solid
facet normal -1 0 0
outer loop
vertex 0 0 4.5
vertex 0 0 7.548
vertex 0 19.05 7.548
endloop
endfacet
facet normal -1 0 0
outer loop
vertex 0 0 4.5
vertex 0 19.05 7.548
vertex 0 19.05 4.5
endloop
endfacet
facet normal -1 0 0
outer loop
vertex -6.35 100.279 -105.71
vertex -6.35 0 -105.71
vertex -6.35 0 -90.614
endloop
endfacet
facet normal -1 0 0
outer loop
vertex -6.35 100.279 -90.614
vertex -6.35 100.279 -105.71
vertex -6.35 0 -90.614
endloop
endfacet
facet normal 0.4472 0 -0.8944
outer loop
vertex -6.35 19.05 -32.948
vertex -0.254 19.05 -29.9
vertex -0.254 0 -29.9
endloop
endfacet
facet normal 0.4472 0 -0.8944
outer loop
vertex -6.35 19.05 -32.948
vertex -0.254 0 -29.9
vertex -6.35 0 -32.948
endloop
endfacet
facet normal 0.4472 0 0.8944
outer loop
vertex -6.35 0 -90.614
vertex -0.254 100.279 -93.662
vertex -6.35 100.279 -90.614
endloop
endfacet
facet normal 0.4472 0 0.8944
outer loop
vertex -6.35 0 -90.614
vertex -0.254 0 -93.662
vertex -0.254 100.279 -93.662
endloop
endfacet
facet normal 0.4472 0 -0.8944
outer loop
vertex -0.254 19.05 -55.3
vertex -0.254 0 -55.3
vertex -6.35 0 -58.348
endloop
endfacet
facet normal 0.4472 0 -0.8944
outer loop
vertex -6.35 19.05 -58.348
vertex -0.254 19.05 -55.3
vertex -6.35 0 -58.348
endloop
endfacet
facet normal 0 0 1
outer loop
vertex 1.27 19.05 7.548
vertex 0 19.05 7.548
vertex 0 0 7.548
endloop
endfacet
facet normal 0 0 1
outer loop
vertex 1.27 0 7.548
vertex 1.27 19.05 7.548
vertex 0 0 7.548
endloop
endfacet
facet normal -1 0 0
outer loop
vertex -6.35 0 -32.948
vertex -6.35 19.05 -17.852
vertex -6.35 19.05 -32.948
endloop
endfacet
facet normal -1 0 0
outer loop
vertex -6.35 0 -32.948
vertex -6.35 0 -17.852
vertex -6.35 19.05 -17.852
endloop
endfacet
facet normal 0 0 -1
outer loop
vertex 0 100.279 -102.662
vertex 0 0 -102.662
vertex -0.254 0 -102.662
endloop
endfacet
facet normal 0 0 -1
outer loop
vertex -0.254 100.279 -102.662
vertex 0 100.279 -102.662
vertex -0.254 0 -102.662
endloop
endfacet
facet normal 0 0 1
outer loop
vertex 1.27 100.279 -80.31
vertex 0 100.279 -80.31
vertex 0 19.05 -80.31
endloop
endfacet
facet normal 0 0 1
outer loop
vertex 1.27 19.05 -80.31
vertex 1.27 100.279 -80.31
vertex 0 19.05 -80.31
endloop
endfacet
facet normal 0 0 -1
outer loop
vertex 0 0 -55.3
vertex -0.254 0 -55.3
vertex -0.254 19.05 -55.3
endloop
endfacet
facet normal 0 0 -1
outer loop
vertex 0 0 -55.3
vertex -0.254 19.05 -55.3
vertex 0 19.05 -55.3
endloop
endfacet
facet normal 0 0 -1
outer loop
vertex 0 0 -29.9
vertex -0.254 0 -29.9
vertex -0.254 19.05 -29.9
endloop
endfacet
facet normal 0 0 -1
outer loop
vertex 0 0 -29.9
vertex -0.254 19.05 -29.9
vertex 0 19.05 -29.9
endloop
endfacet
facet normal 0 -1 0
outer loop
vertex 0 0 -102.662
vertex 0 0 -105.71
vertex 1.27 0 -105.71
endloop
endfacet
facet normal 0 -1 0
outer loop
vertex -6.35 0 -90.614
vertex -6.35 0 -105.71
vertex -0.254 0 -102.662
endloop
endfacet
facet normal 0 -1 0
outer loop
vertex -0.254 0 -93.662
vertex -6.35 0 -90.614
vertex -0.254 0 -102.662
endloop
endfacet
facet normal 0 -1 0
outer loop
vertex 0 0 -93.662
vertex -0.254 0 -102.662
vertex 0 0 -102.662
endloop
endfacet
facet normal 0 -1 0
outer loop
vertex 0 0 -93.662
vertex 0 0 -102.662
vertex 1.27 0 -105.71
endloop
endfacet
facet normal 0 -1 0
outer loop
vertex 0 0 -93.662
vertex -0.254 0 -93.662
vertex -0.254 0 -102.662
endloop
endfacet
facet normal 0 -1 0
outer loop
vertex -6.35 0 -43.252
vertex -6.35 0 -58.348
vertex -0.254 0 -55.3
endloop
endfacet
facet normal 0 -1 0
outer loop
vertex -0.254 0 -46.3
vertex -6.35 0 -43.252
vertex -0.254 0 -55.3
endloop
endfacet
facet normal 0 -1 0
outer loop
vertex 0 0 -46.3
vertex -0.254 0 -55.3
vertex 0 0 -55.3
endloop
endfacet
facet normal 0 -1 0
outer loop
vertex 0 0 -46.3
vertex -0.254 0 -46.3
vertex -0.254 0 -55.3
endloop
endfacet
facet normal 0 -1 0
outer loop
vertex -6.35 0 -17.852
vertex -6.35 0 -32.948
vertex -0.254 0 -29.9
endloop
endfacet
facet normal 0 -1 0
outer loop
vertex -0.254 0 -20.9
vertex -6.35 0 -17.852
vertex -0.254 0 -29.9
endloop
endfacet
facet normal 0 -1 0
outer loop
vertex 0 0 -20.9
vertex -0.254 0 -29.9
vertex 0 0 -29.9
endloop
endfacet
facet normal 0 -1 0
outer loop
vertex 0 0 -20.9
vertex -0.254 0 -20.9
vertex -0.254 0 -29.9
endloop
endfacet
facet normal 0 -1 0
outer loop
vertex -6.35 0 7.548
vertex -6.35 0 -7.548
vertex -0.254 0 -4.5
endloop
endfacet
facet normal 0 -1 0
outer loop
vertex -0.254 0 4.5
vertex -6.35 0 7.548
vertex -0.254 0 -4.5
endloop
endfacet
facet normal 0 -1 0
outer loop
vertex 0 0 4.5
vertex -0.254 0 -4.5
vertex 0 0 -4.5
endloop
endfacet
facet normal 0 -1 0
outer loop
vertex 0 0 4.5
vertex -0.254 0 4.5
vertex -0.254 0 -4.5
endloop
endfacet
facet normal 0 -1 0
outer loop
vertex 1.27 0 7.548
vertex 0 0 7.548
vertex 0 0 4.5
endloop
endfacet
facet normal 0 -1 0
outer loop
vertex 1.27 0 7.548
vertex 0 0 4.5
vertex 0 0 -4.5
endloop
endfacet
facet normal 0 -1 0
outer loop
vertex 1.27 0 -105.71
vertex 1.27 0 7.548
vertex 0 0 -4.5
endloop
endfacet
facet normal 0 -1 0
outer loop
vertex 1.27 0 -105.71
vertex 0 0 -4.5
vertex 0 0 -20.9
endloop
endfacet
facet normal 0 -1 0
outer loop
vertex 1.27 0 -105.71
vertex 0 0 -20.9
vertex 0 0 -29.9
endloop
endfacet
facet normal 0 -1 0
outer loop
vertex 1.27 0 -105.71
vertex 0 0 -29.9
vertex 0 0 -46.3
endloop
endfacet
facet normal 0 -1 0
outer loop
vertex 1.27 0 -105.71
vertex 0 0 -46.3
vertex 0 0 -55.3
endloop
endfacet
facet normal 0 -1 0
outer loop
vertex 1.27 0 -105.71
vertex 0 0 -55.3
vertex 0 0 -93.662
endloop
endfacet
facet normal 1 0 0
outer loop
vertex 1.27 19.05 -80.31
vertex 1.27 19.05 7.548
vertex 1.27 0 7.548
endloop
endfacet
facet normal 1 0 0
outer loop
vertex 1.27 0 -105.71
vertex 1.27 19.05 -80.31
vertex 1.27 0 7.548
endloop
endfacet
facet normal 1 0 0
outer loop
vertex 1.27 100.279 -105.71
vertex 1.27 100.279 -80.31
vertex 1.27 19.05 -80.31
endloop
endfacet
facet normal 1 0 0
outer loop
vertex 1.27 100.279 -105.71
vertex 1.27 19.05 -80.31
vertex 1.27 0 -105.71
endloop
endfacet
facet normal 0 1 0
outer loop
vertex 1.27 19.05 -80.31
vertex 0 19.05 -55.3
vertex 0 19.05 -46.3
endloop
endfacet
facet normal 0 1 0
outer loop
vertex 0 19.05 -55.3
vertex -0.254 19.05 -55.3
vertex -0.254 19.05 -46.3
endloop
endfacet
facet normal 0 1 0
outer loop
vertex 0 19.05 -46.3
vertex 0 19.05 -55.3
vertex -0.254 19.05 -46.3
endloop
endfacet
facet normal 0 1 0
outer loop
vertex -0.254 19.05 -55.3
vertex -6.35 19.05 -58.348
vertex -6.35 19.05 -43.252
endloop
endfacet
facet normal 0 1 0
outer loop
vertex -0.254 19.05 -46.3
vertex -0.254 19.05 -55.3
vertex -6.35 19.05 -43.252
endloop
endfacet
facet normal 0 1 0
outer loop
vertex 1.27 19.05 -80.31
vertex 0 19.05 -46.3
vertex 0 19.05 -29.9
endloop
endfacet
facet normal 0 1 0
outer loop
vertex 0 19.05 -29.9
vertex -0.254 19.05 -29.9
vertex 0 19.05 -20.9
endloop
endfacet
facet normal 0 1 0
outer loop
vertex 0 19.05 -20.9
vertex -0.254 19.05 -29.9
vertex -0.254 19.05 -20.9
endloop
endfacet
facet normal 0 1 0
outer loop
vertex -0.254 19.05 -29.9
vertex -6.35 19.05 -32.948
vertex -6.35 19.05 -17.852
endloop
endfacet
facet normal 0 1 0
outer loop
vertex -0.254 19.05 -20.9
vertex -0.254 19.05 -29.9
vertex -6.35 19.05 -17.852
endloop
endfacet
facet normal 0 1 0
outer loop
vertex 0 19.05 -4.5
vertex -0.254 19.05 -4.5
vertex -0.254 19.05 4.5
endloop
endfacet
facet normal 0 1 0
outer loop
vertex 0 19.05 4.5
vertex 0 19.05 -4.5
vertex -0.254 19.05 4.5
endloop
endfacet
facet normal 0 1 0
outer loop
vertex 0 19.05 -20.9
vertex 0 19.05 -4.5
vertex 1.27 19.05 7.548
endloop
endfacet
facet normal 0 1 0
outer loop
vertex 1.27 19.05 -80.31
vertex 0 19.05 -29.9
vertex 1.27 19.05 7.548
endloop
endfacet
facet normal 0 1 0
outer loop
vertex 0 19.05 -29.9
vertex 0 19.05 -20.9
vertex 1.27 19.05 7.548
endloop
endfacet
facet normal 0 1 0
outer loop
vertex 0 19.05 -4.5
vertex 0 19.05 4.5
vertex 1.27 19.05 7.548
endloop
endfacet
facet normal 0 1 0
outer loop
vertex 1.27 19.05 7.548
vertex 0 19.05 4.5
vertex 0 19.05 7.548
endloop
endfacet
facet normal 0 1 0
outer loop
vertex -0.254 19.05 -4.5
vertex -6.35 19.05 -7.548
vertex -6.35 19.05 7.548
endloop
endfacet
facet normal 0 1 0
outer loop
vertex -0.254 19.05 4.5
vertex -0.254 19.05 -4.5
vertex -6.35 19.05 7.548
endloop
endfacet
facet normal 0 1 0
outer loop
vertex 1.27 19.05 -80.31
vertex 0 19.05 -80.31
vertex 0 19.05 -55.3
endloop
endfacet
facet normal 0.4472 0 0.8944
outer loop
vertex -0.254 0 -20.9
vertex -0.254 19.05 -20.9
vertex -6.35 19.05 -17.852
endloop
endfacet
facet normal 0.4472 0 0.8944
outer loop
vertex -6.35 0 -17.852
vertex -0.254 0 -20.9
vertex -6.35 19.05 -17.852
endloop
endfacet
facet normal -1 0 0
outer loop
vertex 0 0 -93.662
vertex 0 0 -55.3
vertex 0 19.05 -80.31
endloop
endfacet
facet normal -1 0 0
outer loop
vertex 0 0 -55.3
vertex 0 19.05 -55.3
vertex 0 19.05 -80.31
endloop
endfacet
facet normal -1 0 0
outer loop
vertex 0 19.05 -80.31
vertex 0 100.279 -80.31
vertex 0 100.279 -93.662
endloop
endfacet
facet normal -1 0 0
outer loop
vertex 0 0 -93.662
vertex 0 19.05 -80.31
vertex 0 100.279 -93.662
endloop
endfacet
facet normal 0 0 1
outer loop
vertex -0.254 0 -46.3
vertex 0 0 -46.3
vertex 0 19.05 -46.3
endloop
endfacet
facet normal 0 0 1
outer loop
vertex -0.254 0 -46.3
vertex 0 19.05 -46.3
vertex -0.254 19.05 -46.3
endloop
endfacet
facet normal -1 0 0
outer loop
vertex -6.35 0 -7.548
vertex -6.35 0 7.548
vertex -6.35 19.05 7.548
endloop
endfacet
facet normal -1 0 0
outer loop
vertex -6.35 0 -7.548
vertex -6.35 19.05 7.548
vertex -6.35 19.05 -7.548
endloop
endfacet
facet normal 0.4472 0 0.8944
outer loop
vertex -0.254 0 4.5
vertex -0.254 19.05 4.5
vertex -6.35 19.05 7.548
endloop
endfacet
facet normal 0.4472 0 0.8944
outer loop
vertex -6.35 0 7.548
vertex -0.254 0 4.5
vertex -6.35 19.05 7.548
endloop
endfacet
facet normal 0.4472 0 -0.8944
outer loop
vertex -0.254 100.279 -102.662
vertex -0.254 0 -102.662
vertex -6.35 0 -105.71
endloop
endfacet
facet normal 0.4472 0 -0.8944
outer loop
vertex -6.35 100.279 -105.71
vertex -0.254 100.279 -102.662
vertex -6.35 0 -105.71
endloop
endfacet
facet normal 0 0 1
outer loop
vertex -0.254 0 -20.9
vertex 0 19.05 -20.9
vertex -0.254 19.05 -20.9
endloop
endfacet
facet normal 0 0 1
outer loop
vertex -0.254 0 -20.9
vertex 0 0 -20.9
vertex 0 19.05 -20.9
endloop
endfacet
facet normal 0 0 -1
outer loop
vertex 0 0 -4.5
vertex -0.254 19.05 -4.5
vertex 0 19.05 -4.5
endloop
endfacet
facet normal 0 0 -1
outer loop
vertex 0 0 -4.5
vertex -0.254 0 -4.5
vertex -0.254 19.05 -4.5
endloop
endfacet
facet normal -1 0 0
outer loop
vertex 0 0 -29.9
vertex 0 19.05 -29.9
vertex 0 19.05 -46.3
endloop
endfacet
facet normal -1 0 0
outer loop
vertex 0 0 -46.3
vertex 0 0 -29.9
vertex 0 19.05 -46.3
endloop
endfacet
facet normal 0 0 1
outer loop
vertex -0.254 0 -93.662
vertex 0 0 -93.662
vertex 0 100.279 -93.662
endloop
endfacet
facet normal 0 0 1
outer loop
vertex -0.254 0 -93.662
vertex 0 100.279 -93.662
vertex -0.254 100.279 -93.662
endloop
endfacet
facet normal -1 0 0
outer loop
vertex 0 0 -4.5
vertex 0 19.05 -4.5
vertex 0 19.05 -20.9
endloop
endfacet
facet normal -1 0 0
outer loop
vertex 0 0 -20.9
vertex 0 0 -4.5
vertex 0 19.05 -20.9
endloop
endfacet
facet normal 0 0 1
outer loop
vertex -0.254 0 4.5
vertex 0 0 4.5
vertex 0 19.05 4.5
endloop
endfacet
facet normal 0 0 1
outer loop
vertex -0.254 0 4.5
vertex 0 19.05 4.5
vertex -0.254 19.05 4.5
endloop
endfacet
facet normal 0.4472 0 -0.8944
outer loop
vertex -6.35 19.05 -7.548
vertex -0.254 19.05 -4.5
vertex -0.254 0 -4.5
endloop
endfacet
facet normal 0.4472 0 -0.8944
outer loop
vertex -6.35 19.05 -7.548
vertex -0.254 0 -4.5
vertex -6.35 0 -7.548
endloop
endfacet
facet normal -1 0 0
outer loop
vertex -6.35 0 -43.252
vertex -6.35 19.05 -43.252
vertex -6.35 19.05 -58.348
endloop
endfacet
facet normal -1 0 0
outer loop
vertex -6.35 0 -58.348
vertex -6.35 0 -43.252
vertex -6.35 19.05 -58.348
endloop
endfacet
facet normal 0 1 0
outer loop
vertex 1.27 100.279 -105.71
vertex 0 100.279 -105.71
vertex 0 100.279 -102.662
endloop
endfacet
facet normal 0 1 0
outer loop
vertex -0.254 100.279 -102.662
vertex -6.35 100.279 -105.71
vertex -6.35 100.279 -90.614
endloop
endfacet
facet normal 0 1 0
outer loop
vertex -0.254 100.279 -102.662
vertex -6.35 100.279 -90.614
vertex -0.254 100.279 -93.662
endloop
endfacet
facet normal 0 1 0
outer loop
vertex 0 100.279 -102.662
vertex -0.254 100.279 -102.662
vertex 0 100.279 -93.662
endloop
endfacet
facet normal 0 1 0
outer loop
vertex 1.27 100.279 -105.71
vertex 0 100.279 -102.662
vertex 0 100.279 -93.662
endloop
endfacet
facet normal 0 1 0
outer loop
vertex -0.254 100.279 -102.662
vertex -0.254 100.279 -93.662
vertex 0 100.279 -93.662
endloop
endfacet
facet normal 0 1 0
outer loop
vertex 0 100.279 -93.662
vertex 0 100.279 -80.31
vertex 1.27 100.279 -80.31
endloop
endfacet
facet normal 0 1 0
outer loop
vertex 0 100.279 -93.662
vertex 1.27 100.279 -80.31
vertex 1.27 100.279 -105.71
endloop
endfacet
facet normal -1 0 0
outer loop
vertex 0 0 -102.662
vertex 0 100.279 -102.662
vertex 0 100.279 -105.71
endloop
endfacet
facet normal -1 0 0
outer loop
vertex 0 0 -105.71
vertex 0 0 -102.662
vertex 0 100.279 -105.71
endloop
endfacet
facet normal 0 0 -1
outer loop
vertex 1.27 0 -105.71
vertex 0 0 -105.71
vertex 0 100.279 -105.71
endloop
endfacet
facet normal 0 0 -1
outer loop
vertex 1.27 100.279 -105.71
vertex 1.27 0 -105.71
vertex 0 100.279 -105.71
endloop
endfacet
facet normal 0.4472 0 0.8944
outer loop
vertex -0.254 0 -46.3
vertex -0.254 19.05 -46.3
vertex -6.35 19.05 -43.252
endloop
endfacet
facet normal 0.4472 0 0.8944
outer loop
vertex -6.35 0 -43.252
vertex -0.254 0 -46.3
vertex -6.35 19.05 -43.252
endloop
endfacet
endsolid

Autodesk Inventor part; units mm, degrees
ref_plane "YZ Plane" through (0, 0, 0) normal (1, 0, 0) x (0, 1, 0)
ref_plane "XZ Plane" through (0, 0, 0) normal (0, 1, 0) x (-1, 0, 0)
ref_plane "XY Plane" through (0, 0, 0) normal (0, 0, 1) x (1, 0, 0)
sketch "Sketch1" plane through (0, 0, 0) normal (0, 1, 0) x (-1, 0, 0)
  line L0 (0, 4.5) -> (0.254, 4.5)
  line L1 (0.254, -4.5) -> (0, -4.5)
  line L2 (6.35, 4.5) -> (6.35, -4.5)
  line L3 (6.35, 7.548) -> (6.35, 4.5)
  line L4 (6.35, -7.548) -> (6.35, -4.5)
  line L5 (0.254, 4.5) -> (6.35, 7.548)
  line L6 (0.254, -4.5) -> (6.35, -7.548)
  line L7 (0, 4.5) -> (0, -4.5)
  line L8 (0, -20.9) -> (0.254, -20.9)
  line L9 (0.254, -29.9) -> (0, -29.9)
  line L10 (6.35, -20.9) -> (6.35, -29.9)
  line L11 (6.35, -17.852) -> (6.35, -20.9)
  line L12 (6.35, -32.948) -> (6.35, -29.9)
  line L13 (0.254, -20.9) -> (6.35, -17.852)
  line L14 (0.254, -29.9) -> (6.35, -32.948)
  line L15 (0, -20.9) -> (0, -29.9)
  line L16 (0, -46.3) -> (0.254, -46.3)
  line L17 (0.254, -55.3) -> (0, -55.3)
  line L18 (6.35, -46.3) -> (6.35, -55.3)
  line L19 (6.35, -43.252) -> (6.35, -46.3)
  line L20 (6.35, -58.348) -> (6.35, -55.3)
  line L21 (0.254, -46.3) -> (6.35, -43.252)
  line L22 (0.254, -55.3) -> (6.35, -58.348)
  line L23 (0, -46.3) -> (0, -55.3)
  line L24 (0, -71.7) -> (0.254, -71.7)
  line L25 (0.254, -80.7) -> (0, -80.7)
  line L26 (6.35, -71.7) -> (6.35, -80.7)
  line L27 (6.35, -68.652) -> (6.35, -71.7)
  line L28 (6.35, -83.748) -> (6.35, -80.7)
  line L29 (0.254, -71.7) -> (6.35, -68.652)
  line L30 (0.254, -80.7) -> (6.35, -83.748)
  line L31 (0, -71.7) -> (0, -80.7)
  point P0 (0, 0)
  dimension "d16" = 6.096
  dimension "d25" = 9
  dimension "d26" = 3.048
  dimension "d27" = 3.048
  dimension "d28" = 0.254
  dimension "d29" = 0.254
  dimension "d33" = 25.4
extrude "Shape" add sketch "Sketch1" along normal blind 19.05 contours L0 L5 L3 L2 L4 L6 L1 L7 | L8 L13 L11 L10 L12 L14 L9 L15 | L16 L21 L19 L18 L20 L22 L17 L23
sketch "Sketch4" plane through (0, 0, 0) normal (0, -1, 0) x (1, 0, 0)
  line L0 (0, -55.3) -> (-0.254, -55.3) construction
  line L1 (0, -46.3) -> (0, -55.3) construction
  line L2 (-6.35, -43.252) -> (-0.254, -46.3) construction
  line L3 (-6.35, -58.348) -> (-6.35, -43.252) construction
  line L4 (-0.254, -55.3) -> (-6.35, -58.348) construction
  line L5 (-0.254, -46.3) -> (0, -46.3) construction
  line L6 (0, -93.6625) -> (-0.254, -93.6625)
  line L7 (-0.254, -93.6625) -> (-6.35, -90.6145)
  line L8 (-6.35, -105.7105) -> (-6.35, -90.6145)
  line L9 (-0.254, -55.3) -> (-6.35, -58.348) projected
  line L10 (-0.254, -102.6625) -> (-6.35, -105.7105)
  line L11 (0, -102.6625) -> (-0.254, -102.6625)
  line L12 (0, -102.6625) -> (0, -93.6625)
  line L13 (-0.254, -46.3) -> (0, -46.3) projected
  line L14 (0, -46.3) -> (0, -55.3) projected
  line L15 (0, -55.3) -> (0, -93.4) construction
  point P0 (0, 0)
  dimension "d43" = 38.1
extrude "Extrusion4" add sketch "Sketch4" against normal blind 100.2792
sketch "Sketch5" plane through (0, 0, -93.6625) normal (1, 0, 0) x (0, 0, -1)
  line L0 (12.048, 0) -> (12.048, 100.2792) construction
  line L1 (0, 100.2792) -> (9, 100.2792) construction
  line L2 (-101.2105, 0) -> (-101.2105, 19.05) construction
  line L3 (-86.1145, 0) -> (-101.2105, 0) projected
  line L4 (12.048, 0) -> (9, 0) projected
  line L5 (-101.2105, 0) -> (12.048, 0)
  line L6 (9, 100.2792) -> (12.048, 100.2792) projected
  line L7 (12.048, 0) -> (12.048, 100.2792)
  line L8 (12.048, 100.2792) -> (-13.352, 100.2792)
  line L9 (-13.352, 100.2792) -> (-13.352, 19.05)
  line L10 (-38.3625, 19.05) -> (-35.3145, 19.05) projected
  line L11 (-86.1145, 19.05) -> (-101.2105, 19.05) projected
  line L12 (-13.352, 19.05) -> (-101.2105, 19.05)
  line L13 (-101.2105, 19.05) -> (-101.2105, 0)
  point P0 (-93.6625, 0)
  point P1 (-101.2105, 100.2792)
  dimension "d46" = 25.4
extrude "Extrusion5" add sketch "Sketch5" along normal blind 1.27
sketch "Sketch6" plane through (-6.35, 0, -105.7105) normal (-1, 0, 0) x (0, 0, 1)
  line L0 (0, 100.2792) -> (15.096, 100.2792) projected
  line L1 (7.548, 100.2792) -> (7.548, 0) construction
  line L2 (113.2585, 0) -> (0, 0) projected
  circle A0 centre (7.548, 9.525) radius 1.9304
  circle A1 centre (7.548, 36.4744) radius 1.9304
  circle A2 centre (7.548, 63.4238) radius 1.9304
  circle A3 centre (7.548, 90.3732) radius 1.9304
  circle A4 centre (106.4852, 9.525) radius 1.9304
  circle A5 centre (79.5358, 9.525) radius 1.9304
  line L3 (113.2585, 0) -> (113.2585, 19.05) projected
  line L4 (25.4, 19.05) -> (113.2585, 19.05) construction
  line L5 (105.7105, 19.05) -> (105.7105, 0) construction
  line L6 (72.7625, 19.05) -> (87.8585, 19.05) construction
  line L7 (80.3105, 19.05) -> (80.3105, 0) construction
  line L8 (72.7625, 0) -> (87.8585, 0) construction
  line L9 (72.7625, 0) -> (72.7625, 19.05) projected
  line L10 (87.8585, 0) -> (87.8585, 19.05) projected
  dimension "d54" = 26.9494
  dimension "d48" = 3.8608
  dimension "d51" = 26.9494
  dimension "d57" = 3.8608
  dimension "d60" = 26.9494
  dimension "d69" = 0.7747
equation "\"d27\" = d26"
equation "\"d29\" = d28"
properties part number "Sliding test wall"
